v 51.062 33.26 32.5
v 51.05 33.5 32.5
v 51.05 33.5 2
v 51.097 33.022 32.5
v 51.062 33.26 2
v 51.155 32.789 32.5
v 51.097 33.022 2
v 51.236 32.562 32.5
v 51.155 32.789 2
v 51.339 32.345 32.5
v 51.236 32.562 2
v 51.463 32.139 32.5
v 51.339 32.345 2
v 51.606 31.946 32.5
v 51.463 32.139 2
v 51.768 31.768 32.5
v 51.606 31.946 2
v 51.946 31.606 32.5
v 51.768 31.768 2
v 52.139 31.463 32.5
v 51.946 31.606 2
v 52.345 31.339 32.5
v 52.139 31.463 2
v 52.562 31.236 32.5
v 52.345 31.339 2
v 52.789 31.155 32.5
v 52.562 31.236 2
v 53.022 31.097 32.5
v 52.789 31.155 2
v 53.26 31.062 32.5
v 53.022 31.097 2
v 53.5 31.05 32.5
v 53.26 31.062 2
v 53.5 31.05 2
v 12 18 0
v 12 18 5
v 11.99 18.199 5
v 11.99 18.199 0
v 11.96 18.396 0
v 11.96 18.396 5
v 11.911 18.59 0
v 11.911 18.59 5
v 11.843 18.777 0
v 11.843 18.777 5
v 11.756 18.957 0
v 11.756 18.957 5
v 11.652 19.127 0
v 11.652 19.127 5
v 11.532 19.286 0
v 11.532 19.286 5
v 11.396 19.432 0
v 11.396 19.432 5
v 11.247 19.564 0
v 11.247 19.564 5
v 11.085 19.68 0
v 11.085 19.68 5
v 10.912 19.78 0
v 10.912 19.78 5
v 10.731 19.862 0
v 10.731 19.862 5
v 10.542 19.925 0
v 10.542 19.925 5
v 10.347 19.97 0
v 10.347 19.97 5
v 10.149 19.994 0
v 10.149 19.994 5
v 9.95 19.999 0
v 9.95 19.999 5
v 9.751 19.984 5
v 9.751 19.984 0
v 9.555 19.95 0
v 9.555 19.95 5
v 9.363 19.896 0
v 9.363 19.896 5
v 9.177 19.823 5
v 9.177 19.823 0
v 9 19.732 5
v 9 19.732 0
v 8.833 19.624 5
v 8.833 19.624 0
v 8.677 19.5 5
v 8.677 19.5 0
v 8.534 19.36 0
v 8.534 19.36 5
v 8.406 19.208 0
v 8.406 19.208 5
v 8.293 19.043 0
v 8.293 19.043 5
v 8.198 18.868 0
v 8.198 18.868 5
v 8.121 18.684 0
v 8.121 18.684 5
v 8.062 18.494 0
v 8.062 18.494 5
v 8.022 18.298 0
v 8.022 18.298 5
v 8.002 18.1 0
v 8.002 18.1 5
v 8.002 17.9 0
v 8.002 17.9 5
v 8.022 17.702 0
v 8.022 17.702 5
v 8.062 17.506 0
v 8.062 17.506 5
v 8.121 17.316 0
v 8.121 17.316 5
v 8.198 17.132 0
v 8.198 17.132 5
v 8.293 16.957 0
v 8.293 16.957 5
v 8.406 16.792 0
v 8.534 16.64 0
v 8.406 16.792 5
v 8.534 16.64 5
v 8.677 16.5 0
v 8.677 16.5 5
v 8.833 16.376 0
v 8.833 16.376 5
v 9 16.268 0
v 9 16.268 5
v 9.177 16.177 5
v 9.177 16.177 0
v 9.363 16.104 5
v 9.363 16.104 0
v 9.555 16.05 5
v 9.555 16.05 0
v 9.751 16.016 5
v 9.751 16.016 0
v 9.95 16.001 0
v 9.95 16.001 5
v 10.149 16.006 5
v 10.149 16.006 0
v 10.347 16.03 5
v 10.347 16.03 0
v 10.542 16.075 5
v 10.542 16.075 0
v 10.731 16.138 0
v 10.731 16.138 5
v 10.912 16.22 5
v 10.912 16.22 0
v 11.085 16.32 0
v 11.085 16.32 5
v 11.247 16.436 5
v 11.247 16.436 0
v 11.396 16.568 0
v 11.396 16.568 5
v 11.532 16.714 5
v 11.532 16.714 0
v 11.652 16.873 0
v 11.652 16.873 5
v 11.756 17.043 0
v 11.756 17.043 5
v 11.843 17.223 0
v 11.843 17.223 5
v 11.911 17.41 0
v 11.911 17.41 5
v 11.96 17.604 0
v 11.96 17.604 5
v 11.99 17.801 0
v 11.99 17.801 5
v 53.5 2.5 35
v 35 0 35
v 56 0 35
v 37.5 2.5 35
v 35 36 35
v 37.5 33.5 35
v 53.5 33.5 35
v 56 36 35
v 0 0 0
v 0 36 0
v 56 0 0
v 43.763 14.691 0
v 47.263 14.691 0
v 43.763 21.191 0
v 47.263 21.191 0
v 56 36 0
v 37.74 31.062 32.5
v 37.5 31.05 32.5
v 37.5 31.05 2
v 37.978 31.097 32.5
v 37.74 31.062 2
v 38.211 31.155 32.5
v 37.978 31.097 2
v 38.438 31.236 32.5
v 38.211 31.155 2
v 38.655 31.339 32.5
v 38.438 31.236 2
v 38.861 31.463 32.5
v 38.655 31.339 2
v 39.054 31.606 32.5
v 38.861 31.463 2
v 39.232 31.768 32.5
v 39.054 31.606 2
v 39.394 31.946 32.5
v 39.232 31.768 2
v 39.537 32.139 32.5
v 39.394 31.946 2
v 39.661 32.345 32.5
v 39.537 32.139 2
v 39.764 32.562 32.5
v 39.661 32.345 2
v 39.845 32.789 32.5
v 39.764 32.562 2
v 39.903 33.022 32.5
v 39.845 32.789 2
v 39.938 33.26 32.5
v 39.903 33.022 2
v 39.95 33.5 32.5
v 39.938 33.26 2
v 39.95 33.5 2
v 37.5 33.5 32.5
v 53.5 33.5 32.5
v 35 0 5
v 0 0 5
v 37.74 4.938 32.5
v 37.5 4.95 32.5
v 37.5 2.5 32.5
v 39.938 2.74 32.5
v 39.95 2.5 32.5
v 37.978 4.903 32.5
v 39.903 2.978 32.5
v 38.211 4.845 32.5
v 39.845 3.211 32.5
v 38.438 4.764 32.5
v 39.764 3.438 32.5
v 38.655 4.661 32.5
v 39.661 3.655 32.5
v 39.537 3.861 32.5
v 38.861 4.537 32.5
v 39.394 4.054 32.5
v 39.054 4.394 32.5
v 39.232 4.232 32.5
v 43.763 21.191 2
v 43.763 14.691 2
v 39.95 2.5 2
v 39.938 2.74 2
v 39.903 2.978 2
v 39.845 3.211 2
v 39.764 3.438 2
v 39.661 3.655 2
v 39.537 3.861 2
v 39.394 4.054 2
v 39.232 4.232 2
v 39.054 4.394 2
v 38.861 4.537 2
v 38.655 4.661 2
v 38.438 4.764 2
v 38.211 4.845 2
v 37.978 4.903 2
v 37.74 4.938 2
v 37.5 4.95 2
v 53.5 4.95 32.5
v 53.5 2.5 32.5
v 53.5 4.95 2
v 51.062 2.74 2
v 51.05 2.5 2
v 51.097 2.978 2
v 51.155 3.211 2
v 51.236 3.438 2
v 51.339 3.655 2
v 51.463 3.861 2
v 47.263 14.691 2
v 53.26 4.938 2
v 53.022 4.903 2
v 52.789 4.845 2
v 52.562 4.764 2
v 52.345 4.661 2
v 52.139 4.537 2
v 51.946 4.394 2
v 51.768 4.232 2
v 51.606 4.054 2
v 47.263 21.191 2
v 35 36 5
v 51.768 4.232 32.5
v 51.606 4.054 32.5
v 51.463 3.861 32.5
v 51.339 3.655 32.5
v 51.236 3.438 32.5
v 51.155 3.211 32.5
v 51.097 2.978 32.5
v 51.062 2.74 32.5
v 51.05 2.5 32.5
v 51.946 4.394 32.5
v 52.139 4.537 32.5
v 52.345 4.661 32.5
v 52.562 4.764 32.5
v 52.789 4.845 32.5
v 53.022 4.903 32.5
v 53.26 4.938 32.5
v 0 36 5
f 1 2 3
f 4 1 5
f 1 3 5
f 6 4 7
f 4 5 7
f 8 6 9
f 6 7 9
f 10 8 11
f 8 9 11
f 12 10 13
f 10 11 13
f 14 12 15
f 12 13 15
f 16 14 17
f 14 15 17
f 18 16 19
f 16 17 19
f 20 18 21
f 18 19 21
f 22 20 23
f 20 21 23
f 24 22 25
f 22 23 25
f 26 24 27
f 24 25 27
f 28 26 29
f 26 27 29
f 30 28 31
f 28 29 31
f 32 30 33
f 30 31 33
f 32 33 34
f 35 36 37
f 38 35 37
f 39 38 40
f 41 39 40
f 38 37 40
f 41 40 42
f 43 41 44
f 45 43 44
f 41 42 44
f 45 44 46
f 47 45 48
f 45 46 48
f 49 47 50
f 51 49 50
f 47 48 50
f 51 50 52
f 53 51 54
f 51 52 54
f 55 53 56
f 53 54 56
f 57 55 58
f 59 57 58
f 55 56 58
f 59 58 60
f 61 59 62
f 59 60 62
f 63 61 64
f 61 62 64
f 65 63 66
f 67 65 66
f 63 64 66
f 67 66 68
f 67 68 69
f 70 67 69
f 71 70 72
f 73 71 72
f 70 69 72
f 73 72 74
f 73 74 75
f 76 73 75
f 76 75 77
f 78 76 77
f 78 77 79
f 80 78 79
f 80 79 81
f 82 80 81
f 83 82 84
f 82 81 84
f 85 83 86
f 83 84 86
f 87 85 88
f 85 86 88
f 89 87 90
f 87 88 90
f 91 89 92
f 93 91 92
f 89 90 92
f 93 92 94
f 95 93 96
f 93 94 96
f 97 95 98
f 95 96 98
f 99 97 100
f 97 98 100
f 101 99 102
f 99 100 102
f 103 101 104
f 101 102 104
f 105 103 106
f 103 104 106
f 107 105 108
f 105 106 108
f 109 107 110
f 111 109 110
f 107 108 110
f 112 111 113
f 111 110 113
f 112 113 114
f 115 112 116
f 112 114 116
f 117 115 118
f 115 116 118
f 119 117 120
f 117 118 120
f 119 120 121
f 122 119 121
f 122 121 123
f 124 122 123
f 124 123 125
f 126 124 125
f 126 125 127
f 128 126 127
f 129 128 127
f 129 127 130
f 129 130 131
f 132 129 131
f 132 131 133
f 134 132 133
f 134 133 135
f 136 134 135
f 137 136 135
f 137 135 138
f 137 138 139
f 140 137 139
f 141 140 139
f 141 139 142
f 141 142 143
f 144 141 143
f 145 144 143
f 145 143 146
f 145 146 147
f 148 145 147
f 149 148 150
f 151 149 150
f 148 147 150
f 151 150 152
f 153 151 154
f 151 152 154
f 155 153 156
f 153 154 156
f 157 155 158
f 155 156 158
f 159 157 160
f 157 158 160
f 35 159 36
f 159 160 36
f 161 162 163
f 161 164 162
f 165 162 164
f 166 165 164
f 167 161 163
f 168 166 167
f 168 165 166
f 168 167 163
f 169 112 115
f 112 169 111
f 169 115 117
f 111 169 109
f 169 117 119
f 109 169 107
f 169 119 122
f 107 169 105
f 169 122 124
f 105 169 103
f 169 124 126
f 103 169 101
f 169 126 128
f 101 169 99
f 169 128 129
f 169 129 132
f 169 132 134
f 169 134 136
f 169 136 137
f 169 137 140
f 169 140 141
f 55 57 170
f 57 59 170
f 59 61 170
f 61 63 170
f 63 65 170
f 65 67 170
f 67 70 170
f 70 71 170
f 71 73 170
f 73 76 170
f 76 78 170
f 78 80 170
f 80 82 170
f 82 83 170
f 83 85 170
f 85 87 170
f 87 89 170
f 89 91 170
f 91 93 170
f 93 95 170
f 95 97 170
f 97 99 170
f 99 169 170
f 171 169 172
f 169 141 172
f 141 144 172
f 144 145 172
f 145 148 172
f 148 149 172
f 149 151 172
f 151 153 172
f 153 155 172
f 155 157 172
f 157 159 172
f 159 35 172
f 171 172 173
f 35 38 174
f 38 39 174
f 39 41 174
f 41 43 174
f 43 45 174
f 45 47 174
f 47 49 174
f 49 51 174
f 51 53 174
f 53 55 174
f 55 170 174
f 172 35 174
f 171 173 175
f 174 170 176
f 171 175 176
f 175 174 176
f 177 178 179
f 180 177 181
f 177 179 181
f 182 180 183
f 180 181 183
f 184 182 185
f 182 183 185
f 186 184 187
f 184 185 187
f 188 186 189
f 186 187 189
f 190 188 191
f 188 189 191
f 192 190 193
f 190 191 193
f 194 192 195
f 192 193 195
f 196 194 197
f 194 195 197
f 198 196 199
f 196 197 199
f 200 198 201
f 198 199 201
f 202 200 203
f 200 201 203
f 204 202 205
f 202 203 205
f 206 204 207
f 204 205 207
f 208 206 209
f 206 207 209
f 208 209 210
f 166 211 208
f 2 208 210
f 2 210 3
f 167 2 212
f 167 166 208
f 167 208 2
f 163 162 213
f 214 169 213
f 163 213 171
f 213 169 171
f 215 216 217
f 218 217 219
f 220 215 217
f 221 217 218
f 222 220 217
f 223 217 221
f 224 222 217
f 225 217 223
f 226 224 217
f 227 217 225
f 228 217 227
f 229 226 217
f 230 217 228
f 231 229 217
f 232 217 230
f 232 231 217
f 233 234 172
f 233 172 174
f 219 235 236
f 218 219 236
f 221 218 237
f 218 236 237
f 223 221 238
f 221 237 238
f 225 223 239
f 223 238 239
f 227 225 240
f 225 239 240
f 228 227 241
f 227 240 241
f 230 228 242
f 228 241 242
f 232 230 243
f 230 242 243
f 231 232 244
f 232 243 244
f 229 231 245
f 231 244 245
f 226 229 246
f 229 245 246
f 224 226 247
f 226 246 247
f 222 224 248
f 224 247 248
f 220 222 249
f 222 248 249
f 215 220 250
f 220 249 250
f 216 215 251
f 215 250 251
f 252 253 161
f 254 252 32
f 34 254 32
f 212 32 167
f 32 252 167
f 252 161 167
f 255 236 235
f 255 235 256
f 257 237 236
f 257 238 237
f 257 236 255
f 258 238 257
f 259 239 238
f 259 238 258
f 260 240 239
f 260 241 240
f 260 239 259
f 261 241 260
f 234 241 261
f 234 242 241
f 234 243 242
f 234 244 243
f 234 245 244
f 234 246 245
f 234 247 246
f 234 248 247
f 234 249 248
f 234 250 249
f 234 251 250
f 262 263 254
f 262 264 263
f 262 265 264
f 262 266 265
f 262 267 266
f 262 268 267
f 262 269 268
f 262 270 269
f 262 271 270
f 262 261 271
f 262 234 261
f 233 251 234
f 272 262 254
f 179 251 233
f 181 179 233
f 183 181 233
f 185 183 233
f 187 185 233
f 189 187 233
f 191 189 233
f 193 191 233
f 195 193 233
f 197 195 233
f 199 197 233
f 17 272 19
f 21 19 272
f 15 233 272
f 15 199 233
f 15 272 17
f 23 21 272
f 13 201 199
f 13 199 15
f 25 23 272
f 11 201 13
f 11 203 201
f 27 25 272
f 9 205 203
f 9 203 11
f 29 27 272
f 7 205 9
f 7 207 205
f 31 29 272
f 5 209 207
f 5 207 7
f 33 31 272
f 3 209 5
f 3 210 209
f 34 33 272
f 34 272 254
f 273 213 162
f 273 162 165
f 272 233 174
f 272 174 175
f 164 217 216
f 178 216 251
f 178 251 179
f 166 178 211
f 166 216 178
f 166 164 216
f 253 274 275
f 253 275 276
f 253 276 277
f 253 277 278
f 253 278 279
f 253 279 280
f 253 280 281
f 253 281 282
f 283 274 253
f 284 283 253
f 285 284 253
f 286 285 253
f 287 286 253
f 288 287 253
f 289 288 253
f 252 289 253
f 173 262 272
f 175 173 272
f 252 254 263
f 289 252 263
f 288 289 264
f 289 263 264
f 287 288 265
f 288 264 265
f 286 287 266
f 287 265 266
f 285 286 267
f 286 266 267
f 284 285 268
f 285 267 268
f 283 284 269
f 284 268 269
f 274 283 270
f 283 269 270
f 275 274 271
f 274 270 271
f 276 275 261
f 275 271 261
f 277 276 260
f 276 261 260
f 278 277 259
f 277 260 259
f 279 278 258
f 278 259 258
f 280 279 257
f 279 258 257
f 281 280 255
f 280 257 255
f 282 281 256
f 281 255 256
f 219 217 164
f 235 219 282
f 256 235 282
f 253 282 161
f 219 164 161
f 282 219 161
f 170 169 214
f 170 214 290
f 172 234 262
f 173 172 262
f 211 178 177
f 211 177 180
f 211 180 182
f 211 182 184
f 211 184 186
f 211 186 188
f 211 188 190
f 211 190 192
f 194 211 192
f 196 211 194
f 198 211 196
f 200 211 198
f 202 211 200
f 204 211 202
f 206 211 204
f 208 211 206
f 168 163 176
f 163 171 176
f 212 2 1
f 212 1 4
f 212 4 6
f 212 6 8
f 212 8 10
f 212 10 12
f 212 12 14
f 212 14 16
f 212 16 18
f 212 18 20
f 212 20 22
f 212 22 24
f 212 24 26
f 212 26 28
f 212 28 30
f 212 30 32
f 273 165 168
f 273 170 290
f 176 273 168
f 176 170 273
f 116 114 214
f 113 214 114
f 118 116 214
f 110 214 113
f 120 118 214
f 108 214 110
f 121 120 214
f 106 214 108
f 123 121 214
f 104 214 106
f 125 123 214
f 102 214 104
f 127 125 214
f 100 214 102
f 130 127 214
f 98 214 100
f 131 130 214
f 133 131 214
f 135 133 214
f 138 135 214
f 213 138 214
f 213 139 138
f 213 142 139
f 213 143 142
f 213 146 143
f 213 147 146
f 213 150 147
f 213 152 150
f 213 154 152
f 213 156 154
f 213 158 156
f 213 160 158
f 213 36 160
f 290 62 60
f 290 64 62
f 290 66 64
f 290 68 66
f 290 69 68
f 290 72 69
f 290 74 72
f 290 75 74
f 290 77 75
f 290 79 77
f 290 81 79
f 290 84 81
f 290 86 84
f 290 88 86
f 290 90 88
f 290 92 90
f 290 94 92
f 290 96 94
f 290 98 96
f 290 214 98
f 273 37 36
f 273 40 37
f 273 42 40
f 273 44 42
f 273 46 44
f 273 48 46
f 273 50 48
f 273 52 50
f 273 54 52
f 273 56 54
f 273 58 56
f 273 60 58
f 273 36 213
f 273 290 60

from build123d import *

# Parameters (mm, degrees)
SKETCH_W        = 56
SKETCH_H        = 36
PAD_DEPTH       = 5
SKETCH001_W     = 21
SKETCH001_H     = 36
PAD001_DEPTH    = 30
SKETCH002_W     = 16
SKETCH002_H     = 31
POCKET_DEPTH    = 33
SKETCH003_R     = 2.45
PAD002_DEPTH    = 30.5
SKETCH004_W     = 3.5
SKETCH004_H     = 6.5
POCKET001_DEPTH = 2
SKETCH005_R     = 2
POCKET002_DEPTH = 5


with BuildPart() as part:
    # Sketch → Pad (new body)
    with BuildSketch(Plane.XY):
        with Locations((28, 18)):
            Rectangle(SKETCH_W, SKETCH_H)
    extrude(amount=PAD_DEPTH)

    # Sketch001 (on Face6 of Pad) → Pad001 (join)
    with BuildSketch(Plane.XY.offset(5)):
        with Locations((45.5, 18)):
            Rectangle(SKETCH001_W, SKETCH001_H)
    extrude(amount=PAD001_DEPTH)

    # Sketch002 (on Face10 of Pad001) → Pocket (cut)
    with BuildSketch(Plane.XY.offset(35)):
        with Locations((45.5, 18)):
            Rectangle(SKETCH002_W, SKETCH002_H)
    extrude(amount=-POCKET_DEPTH, mode=Mode.SUBTRACT)

    # Sketch003 (on Face16 of Pocket) → Pad002 (join)
    with BuildSketch(Plane.XY.offset(2)):
        with Locations((37.5, 33.5)):
            Circle(SKETCH003_R)
        with Locations((53.5, 33.5)):
            Circle(SKETCH003_R)
        with Locations((37.5, 2.5)):
            Circle(SKETCH003_R)
        with Locations((53.5, 2.5)):
            Circle(SKETCH003_R)
    extrude(amount=PAD002_DEPTH)

    # Sketch004 (on Face18 of Pad002) → Pocket001 (cut)
    with BuildSketch(Plane.XY.offset(2)):
        with Locations((45.513299, 17.941233)):
            Rectangle(SKETCH004_W, SKETCH004_H)
    extrude(amount=-POCKET001_DEPTH, mode=Mode.SUBTRACT)

    # Sketch005 (on Face5 of Pocket001) → Pocket002 (cut)
    with BuildSketch(Plane.XY.offset(5)):
        with Locations((10, 18)):
            Circle(SKETCH005_R)
    extrude(amount=-POCKET002_DEPTH, mode=Mode.SUBTRACT)


solid = part.part
